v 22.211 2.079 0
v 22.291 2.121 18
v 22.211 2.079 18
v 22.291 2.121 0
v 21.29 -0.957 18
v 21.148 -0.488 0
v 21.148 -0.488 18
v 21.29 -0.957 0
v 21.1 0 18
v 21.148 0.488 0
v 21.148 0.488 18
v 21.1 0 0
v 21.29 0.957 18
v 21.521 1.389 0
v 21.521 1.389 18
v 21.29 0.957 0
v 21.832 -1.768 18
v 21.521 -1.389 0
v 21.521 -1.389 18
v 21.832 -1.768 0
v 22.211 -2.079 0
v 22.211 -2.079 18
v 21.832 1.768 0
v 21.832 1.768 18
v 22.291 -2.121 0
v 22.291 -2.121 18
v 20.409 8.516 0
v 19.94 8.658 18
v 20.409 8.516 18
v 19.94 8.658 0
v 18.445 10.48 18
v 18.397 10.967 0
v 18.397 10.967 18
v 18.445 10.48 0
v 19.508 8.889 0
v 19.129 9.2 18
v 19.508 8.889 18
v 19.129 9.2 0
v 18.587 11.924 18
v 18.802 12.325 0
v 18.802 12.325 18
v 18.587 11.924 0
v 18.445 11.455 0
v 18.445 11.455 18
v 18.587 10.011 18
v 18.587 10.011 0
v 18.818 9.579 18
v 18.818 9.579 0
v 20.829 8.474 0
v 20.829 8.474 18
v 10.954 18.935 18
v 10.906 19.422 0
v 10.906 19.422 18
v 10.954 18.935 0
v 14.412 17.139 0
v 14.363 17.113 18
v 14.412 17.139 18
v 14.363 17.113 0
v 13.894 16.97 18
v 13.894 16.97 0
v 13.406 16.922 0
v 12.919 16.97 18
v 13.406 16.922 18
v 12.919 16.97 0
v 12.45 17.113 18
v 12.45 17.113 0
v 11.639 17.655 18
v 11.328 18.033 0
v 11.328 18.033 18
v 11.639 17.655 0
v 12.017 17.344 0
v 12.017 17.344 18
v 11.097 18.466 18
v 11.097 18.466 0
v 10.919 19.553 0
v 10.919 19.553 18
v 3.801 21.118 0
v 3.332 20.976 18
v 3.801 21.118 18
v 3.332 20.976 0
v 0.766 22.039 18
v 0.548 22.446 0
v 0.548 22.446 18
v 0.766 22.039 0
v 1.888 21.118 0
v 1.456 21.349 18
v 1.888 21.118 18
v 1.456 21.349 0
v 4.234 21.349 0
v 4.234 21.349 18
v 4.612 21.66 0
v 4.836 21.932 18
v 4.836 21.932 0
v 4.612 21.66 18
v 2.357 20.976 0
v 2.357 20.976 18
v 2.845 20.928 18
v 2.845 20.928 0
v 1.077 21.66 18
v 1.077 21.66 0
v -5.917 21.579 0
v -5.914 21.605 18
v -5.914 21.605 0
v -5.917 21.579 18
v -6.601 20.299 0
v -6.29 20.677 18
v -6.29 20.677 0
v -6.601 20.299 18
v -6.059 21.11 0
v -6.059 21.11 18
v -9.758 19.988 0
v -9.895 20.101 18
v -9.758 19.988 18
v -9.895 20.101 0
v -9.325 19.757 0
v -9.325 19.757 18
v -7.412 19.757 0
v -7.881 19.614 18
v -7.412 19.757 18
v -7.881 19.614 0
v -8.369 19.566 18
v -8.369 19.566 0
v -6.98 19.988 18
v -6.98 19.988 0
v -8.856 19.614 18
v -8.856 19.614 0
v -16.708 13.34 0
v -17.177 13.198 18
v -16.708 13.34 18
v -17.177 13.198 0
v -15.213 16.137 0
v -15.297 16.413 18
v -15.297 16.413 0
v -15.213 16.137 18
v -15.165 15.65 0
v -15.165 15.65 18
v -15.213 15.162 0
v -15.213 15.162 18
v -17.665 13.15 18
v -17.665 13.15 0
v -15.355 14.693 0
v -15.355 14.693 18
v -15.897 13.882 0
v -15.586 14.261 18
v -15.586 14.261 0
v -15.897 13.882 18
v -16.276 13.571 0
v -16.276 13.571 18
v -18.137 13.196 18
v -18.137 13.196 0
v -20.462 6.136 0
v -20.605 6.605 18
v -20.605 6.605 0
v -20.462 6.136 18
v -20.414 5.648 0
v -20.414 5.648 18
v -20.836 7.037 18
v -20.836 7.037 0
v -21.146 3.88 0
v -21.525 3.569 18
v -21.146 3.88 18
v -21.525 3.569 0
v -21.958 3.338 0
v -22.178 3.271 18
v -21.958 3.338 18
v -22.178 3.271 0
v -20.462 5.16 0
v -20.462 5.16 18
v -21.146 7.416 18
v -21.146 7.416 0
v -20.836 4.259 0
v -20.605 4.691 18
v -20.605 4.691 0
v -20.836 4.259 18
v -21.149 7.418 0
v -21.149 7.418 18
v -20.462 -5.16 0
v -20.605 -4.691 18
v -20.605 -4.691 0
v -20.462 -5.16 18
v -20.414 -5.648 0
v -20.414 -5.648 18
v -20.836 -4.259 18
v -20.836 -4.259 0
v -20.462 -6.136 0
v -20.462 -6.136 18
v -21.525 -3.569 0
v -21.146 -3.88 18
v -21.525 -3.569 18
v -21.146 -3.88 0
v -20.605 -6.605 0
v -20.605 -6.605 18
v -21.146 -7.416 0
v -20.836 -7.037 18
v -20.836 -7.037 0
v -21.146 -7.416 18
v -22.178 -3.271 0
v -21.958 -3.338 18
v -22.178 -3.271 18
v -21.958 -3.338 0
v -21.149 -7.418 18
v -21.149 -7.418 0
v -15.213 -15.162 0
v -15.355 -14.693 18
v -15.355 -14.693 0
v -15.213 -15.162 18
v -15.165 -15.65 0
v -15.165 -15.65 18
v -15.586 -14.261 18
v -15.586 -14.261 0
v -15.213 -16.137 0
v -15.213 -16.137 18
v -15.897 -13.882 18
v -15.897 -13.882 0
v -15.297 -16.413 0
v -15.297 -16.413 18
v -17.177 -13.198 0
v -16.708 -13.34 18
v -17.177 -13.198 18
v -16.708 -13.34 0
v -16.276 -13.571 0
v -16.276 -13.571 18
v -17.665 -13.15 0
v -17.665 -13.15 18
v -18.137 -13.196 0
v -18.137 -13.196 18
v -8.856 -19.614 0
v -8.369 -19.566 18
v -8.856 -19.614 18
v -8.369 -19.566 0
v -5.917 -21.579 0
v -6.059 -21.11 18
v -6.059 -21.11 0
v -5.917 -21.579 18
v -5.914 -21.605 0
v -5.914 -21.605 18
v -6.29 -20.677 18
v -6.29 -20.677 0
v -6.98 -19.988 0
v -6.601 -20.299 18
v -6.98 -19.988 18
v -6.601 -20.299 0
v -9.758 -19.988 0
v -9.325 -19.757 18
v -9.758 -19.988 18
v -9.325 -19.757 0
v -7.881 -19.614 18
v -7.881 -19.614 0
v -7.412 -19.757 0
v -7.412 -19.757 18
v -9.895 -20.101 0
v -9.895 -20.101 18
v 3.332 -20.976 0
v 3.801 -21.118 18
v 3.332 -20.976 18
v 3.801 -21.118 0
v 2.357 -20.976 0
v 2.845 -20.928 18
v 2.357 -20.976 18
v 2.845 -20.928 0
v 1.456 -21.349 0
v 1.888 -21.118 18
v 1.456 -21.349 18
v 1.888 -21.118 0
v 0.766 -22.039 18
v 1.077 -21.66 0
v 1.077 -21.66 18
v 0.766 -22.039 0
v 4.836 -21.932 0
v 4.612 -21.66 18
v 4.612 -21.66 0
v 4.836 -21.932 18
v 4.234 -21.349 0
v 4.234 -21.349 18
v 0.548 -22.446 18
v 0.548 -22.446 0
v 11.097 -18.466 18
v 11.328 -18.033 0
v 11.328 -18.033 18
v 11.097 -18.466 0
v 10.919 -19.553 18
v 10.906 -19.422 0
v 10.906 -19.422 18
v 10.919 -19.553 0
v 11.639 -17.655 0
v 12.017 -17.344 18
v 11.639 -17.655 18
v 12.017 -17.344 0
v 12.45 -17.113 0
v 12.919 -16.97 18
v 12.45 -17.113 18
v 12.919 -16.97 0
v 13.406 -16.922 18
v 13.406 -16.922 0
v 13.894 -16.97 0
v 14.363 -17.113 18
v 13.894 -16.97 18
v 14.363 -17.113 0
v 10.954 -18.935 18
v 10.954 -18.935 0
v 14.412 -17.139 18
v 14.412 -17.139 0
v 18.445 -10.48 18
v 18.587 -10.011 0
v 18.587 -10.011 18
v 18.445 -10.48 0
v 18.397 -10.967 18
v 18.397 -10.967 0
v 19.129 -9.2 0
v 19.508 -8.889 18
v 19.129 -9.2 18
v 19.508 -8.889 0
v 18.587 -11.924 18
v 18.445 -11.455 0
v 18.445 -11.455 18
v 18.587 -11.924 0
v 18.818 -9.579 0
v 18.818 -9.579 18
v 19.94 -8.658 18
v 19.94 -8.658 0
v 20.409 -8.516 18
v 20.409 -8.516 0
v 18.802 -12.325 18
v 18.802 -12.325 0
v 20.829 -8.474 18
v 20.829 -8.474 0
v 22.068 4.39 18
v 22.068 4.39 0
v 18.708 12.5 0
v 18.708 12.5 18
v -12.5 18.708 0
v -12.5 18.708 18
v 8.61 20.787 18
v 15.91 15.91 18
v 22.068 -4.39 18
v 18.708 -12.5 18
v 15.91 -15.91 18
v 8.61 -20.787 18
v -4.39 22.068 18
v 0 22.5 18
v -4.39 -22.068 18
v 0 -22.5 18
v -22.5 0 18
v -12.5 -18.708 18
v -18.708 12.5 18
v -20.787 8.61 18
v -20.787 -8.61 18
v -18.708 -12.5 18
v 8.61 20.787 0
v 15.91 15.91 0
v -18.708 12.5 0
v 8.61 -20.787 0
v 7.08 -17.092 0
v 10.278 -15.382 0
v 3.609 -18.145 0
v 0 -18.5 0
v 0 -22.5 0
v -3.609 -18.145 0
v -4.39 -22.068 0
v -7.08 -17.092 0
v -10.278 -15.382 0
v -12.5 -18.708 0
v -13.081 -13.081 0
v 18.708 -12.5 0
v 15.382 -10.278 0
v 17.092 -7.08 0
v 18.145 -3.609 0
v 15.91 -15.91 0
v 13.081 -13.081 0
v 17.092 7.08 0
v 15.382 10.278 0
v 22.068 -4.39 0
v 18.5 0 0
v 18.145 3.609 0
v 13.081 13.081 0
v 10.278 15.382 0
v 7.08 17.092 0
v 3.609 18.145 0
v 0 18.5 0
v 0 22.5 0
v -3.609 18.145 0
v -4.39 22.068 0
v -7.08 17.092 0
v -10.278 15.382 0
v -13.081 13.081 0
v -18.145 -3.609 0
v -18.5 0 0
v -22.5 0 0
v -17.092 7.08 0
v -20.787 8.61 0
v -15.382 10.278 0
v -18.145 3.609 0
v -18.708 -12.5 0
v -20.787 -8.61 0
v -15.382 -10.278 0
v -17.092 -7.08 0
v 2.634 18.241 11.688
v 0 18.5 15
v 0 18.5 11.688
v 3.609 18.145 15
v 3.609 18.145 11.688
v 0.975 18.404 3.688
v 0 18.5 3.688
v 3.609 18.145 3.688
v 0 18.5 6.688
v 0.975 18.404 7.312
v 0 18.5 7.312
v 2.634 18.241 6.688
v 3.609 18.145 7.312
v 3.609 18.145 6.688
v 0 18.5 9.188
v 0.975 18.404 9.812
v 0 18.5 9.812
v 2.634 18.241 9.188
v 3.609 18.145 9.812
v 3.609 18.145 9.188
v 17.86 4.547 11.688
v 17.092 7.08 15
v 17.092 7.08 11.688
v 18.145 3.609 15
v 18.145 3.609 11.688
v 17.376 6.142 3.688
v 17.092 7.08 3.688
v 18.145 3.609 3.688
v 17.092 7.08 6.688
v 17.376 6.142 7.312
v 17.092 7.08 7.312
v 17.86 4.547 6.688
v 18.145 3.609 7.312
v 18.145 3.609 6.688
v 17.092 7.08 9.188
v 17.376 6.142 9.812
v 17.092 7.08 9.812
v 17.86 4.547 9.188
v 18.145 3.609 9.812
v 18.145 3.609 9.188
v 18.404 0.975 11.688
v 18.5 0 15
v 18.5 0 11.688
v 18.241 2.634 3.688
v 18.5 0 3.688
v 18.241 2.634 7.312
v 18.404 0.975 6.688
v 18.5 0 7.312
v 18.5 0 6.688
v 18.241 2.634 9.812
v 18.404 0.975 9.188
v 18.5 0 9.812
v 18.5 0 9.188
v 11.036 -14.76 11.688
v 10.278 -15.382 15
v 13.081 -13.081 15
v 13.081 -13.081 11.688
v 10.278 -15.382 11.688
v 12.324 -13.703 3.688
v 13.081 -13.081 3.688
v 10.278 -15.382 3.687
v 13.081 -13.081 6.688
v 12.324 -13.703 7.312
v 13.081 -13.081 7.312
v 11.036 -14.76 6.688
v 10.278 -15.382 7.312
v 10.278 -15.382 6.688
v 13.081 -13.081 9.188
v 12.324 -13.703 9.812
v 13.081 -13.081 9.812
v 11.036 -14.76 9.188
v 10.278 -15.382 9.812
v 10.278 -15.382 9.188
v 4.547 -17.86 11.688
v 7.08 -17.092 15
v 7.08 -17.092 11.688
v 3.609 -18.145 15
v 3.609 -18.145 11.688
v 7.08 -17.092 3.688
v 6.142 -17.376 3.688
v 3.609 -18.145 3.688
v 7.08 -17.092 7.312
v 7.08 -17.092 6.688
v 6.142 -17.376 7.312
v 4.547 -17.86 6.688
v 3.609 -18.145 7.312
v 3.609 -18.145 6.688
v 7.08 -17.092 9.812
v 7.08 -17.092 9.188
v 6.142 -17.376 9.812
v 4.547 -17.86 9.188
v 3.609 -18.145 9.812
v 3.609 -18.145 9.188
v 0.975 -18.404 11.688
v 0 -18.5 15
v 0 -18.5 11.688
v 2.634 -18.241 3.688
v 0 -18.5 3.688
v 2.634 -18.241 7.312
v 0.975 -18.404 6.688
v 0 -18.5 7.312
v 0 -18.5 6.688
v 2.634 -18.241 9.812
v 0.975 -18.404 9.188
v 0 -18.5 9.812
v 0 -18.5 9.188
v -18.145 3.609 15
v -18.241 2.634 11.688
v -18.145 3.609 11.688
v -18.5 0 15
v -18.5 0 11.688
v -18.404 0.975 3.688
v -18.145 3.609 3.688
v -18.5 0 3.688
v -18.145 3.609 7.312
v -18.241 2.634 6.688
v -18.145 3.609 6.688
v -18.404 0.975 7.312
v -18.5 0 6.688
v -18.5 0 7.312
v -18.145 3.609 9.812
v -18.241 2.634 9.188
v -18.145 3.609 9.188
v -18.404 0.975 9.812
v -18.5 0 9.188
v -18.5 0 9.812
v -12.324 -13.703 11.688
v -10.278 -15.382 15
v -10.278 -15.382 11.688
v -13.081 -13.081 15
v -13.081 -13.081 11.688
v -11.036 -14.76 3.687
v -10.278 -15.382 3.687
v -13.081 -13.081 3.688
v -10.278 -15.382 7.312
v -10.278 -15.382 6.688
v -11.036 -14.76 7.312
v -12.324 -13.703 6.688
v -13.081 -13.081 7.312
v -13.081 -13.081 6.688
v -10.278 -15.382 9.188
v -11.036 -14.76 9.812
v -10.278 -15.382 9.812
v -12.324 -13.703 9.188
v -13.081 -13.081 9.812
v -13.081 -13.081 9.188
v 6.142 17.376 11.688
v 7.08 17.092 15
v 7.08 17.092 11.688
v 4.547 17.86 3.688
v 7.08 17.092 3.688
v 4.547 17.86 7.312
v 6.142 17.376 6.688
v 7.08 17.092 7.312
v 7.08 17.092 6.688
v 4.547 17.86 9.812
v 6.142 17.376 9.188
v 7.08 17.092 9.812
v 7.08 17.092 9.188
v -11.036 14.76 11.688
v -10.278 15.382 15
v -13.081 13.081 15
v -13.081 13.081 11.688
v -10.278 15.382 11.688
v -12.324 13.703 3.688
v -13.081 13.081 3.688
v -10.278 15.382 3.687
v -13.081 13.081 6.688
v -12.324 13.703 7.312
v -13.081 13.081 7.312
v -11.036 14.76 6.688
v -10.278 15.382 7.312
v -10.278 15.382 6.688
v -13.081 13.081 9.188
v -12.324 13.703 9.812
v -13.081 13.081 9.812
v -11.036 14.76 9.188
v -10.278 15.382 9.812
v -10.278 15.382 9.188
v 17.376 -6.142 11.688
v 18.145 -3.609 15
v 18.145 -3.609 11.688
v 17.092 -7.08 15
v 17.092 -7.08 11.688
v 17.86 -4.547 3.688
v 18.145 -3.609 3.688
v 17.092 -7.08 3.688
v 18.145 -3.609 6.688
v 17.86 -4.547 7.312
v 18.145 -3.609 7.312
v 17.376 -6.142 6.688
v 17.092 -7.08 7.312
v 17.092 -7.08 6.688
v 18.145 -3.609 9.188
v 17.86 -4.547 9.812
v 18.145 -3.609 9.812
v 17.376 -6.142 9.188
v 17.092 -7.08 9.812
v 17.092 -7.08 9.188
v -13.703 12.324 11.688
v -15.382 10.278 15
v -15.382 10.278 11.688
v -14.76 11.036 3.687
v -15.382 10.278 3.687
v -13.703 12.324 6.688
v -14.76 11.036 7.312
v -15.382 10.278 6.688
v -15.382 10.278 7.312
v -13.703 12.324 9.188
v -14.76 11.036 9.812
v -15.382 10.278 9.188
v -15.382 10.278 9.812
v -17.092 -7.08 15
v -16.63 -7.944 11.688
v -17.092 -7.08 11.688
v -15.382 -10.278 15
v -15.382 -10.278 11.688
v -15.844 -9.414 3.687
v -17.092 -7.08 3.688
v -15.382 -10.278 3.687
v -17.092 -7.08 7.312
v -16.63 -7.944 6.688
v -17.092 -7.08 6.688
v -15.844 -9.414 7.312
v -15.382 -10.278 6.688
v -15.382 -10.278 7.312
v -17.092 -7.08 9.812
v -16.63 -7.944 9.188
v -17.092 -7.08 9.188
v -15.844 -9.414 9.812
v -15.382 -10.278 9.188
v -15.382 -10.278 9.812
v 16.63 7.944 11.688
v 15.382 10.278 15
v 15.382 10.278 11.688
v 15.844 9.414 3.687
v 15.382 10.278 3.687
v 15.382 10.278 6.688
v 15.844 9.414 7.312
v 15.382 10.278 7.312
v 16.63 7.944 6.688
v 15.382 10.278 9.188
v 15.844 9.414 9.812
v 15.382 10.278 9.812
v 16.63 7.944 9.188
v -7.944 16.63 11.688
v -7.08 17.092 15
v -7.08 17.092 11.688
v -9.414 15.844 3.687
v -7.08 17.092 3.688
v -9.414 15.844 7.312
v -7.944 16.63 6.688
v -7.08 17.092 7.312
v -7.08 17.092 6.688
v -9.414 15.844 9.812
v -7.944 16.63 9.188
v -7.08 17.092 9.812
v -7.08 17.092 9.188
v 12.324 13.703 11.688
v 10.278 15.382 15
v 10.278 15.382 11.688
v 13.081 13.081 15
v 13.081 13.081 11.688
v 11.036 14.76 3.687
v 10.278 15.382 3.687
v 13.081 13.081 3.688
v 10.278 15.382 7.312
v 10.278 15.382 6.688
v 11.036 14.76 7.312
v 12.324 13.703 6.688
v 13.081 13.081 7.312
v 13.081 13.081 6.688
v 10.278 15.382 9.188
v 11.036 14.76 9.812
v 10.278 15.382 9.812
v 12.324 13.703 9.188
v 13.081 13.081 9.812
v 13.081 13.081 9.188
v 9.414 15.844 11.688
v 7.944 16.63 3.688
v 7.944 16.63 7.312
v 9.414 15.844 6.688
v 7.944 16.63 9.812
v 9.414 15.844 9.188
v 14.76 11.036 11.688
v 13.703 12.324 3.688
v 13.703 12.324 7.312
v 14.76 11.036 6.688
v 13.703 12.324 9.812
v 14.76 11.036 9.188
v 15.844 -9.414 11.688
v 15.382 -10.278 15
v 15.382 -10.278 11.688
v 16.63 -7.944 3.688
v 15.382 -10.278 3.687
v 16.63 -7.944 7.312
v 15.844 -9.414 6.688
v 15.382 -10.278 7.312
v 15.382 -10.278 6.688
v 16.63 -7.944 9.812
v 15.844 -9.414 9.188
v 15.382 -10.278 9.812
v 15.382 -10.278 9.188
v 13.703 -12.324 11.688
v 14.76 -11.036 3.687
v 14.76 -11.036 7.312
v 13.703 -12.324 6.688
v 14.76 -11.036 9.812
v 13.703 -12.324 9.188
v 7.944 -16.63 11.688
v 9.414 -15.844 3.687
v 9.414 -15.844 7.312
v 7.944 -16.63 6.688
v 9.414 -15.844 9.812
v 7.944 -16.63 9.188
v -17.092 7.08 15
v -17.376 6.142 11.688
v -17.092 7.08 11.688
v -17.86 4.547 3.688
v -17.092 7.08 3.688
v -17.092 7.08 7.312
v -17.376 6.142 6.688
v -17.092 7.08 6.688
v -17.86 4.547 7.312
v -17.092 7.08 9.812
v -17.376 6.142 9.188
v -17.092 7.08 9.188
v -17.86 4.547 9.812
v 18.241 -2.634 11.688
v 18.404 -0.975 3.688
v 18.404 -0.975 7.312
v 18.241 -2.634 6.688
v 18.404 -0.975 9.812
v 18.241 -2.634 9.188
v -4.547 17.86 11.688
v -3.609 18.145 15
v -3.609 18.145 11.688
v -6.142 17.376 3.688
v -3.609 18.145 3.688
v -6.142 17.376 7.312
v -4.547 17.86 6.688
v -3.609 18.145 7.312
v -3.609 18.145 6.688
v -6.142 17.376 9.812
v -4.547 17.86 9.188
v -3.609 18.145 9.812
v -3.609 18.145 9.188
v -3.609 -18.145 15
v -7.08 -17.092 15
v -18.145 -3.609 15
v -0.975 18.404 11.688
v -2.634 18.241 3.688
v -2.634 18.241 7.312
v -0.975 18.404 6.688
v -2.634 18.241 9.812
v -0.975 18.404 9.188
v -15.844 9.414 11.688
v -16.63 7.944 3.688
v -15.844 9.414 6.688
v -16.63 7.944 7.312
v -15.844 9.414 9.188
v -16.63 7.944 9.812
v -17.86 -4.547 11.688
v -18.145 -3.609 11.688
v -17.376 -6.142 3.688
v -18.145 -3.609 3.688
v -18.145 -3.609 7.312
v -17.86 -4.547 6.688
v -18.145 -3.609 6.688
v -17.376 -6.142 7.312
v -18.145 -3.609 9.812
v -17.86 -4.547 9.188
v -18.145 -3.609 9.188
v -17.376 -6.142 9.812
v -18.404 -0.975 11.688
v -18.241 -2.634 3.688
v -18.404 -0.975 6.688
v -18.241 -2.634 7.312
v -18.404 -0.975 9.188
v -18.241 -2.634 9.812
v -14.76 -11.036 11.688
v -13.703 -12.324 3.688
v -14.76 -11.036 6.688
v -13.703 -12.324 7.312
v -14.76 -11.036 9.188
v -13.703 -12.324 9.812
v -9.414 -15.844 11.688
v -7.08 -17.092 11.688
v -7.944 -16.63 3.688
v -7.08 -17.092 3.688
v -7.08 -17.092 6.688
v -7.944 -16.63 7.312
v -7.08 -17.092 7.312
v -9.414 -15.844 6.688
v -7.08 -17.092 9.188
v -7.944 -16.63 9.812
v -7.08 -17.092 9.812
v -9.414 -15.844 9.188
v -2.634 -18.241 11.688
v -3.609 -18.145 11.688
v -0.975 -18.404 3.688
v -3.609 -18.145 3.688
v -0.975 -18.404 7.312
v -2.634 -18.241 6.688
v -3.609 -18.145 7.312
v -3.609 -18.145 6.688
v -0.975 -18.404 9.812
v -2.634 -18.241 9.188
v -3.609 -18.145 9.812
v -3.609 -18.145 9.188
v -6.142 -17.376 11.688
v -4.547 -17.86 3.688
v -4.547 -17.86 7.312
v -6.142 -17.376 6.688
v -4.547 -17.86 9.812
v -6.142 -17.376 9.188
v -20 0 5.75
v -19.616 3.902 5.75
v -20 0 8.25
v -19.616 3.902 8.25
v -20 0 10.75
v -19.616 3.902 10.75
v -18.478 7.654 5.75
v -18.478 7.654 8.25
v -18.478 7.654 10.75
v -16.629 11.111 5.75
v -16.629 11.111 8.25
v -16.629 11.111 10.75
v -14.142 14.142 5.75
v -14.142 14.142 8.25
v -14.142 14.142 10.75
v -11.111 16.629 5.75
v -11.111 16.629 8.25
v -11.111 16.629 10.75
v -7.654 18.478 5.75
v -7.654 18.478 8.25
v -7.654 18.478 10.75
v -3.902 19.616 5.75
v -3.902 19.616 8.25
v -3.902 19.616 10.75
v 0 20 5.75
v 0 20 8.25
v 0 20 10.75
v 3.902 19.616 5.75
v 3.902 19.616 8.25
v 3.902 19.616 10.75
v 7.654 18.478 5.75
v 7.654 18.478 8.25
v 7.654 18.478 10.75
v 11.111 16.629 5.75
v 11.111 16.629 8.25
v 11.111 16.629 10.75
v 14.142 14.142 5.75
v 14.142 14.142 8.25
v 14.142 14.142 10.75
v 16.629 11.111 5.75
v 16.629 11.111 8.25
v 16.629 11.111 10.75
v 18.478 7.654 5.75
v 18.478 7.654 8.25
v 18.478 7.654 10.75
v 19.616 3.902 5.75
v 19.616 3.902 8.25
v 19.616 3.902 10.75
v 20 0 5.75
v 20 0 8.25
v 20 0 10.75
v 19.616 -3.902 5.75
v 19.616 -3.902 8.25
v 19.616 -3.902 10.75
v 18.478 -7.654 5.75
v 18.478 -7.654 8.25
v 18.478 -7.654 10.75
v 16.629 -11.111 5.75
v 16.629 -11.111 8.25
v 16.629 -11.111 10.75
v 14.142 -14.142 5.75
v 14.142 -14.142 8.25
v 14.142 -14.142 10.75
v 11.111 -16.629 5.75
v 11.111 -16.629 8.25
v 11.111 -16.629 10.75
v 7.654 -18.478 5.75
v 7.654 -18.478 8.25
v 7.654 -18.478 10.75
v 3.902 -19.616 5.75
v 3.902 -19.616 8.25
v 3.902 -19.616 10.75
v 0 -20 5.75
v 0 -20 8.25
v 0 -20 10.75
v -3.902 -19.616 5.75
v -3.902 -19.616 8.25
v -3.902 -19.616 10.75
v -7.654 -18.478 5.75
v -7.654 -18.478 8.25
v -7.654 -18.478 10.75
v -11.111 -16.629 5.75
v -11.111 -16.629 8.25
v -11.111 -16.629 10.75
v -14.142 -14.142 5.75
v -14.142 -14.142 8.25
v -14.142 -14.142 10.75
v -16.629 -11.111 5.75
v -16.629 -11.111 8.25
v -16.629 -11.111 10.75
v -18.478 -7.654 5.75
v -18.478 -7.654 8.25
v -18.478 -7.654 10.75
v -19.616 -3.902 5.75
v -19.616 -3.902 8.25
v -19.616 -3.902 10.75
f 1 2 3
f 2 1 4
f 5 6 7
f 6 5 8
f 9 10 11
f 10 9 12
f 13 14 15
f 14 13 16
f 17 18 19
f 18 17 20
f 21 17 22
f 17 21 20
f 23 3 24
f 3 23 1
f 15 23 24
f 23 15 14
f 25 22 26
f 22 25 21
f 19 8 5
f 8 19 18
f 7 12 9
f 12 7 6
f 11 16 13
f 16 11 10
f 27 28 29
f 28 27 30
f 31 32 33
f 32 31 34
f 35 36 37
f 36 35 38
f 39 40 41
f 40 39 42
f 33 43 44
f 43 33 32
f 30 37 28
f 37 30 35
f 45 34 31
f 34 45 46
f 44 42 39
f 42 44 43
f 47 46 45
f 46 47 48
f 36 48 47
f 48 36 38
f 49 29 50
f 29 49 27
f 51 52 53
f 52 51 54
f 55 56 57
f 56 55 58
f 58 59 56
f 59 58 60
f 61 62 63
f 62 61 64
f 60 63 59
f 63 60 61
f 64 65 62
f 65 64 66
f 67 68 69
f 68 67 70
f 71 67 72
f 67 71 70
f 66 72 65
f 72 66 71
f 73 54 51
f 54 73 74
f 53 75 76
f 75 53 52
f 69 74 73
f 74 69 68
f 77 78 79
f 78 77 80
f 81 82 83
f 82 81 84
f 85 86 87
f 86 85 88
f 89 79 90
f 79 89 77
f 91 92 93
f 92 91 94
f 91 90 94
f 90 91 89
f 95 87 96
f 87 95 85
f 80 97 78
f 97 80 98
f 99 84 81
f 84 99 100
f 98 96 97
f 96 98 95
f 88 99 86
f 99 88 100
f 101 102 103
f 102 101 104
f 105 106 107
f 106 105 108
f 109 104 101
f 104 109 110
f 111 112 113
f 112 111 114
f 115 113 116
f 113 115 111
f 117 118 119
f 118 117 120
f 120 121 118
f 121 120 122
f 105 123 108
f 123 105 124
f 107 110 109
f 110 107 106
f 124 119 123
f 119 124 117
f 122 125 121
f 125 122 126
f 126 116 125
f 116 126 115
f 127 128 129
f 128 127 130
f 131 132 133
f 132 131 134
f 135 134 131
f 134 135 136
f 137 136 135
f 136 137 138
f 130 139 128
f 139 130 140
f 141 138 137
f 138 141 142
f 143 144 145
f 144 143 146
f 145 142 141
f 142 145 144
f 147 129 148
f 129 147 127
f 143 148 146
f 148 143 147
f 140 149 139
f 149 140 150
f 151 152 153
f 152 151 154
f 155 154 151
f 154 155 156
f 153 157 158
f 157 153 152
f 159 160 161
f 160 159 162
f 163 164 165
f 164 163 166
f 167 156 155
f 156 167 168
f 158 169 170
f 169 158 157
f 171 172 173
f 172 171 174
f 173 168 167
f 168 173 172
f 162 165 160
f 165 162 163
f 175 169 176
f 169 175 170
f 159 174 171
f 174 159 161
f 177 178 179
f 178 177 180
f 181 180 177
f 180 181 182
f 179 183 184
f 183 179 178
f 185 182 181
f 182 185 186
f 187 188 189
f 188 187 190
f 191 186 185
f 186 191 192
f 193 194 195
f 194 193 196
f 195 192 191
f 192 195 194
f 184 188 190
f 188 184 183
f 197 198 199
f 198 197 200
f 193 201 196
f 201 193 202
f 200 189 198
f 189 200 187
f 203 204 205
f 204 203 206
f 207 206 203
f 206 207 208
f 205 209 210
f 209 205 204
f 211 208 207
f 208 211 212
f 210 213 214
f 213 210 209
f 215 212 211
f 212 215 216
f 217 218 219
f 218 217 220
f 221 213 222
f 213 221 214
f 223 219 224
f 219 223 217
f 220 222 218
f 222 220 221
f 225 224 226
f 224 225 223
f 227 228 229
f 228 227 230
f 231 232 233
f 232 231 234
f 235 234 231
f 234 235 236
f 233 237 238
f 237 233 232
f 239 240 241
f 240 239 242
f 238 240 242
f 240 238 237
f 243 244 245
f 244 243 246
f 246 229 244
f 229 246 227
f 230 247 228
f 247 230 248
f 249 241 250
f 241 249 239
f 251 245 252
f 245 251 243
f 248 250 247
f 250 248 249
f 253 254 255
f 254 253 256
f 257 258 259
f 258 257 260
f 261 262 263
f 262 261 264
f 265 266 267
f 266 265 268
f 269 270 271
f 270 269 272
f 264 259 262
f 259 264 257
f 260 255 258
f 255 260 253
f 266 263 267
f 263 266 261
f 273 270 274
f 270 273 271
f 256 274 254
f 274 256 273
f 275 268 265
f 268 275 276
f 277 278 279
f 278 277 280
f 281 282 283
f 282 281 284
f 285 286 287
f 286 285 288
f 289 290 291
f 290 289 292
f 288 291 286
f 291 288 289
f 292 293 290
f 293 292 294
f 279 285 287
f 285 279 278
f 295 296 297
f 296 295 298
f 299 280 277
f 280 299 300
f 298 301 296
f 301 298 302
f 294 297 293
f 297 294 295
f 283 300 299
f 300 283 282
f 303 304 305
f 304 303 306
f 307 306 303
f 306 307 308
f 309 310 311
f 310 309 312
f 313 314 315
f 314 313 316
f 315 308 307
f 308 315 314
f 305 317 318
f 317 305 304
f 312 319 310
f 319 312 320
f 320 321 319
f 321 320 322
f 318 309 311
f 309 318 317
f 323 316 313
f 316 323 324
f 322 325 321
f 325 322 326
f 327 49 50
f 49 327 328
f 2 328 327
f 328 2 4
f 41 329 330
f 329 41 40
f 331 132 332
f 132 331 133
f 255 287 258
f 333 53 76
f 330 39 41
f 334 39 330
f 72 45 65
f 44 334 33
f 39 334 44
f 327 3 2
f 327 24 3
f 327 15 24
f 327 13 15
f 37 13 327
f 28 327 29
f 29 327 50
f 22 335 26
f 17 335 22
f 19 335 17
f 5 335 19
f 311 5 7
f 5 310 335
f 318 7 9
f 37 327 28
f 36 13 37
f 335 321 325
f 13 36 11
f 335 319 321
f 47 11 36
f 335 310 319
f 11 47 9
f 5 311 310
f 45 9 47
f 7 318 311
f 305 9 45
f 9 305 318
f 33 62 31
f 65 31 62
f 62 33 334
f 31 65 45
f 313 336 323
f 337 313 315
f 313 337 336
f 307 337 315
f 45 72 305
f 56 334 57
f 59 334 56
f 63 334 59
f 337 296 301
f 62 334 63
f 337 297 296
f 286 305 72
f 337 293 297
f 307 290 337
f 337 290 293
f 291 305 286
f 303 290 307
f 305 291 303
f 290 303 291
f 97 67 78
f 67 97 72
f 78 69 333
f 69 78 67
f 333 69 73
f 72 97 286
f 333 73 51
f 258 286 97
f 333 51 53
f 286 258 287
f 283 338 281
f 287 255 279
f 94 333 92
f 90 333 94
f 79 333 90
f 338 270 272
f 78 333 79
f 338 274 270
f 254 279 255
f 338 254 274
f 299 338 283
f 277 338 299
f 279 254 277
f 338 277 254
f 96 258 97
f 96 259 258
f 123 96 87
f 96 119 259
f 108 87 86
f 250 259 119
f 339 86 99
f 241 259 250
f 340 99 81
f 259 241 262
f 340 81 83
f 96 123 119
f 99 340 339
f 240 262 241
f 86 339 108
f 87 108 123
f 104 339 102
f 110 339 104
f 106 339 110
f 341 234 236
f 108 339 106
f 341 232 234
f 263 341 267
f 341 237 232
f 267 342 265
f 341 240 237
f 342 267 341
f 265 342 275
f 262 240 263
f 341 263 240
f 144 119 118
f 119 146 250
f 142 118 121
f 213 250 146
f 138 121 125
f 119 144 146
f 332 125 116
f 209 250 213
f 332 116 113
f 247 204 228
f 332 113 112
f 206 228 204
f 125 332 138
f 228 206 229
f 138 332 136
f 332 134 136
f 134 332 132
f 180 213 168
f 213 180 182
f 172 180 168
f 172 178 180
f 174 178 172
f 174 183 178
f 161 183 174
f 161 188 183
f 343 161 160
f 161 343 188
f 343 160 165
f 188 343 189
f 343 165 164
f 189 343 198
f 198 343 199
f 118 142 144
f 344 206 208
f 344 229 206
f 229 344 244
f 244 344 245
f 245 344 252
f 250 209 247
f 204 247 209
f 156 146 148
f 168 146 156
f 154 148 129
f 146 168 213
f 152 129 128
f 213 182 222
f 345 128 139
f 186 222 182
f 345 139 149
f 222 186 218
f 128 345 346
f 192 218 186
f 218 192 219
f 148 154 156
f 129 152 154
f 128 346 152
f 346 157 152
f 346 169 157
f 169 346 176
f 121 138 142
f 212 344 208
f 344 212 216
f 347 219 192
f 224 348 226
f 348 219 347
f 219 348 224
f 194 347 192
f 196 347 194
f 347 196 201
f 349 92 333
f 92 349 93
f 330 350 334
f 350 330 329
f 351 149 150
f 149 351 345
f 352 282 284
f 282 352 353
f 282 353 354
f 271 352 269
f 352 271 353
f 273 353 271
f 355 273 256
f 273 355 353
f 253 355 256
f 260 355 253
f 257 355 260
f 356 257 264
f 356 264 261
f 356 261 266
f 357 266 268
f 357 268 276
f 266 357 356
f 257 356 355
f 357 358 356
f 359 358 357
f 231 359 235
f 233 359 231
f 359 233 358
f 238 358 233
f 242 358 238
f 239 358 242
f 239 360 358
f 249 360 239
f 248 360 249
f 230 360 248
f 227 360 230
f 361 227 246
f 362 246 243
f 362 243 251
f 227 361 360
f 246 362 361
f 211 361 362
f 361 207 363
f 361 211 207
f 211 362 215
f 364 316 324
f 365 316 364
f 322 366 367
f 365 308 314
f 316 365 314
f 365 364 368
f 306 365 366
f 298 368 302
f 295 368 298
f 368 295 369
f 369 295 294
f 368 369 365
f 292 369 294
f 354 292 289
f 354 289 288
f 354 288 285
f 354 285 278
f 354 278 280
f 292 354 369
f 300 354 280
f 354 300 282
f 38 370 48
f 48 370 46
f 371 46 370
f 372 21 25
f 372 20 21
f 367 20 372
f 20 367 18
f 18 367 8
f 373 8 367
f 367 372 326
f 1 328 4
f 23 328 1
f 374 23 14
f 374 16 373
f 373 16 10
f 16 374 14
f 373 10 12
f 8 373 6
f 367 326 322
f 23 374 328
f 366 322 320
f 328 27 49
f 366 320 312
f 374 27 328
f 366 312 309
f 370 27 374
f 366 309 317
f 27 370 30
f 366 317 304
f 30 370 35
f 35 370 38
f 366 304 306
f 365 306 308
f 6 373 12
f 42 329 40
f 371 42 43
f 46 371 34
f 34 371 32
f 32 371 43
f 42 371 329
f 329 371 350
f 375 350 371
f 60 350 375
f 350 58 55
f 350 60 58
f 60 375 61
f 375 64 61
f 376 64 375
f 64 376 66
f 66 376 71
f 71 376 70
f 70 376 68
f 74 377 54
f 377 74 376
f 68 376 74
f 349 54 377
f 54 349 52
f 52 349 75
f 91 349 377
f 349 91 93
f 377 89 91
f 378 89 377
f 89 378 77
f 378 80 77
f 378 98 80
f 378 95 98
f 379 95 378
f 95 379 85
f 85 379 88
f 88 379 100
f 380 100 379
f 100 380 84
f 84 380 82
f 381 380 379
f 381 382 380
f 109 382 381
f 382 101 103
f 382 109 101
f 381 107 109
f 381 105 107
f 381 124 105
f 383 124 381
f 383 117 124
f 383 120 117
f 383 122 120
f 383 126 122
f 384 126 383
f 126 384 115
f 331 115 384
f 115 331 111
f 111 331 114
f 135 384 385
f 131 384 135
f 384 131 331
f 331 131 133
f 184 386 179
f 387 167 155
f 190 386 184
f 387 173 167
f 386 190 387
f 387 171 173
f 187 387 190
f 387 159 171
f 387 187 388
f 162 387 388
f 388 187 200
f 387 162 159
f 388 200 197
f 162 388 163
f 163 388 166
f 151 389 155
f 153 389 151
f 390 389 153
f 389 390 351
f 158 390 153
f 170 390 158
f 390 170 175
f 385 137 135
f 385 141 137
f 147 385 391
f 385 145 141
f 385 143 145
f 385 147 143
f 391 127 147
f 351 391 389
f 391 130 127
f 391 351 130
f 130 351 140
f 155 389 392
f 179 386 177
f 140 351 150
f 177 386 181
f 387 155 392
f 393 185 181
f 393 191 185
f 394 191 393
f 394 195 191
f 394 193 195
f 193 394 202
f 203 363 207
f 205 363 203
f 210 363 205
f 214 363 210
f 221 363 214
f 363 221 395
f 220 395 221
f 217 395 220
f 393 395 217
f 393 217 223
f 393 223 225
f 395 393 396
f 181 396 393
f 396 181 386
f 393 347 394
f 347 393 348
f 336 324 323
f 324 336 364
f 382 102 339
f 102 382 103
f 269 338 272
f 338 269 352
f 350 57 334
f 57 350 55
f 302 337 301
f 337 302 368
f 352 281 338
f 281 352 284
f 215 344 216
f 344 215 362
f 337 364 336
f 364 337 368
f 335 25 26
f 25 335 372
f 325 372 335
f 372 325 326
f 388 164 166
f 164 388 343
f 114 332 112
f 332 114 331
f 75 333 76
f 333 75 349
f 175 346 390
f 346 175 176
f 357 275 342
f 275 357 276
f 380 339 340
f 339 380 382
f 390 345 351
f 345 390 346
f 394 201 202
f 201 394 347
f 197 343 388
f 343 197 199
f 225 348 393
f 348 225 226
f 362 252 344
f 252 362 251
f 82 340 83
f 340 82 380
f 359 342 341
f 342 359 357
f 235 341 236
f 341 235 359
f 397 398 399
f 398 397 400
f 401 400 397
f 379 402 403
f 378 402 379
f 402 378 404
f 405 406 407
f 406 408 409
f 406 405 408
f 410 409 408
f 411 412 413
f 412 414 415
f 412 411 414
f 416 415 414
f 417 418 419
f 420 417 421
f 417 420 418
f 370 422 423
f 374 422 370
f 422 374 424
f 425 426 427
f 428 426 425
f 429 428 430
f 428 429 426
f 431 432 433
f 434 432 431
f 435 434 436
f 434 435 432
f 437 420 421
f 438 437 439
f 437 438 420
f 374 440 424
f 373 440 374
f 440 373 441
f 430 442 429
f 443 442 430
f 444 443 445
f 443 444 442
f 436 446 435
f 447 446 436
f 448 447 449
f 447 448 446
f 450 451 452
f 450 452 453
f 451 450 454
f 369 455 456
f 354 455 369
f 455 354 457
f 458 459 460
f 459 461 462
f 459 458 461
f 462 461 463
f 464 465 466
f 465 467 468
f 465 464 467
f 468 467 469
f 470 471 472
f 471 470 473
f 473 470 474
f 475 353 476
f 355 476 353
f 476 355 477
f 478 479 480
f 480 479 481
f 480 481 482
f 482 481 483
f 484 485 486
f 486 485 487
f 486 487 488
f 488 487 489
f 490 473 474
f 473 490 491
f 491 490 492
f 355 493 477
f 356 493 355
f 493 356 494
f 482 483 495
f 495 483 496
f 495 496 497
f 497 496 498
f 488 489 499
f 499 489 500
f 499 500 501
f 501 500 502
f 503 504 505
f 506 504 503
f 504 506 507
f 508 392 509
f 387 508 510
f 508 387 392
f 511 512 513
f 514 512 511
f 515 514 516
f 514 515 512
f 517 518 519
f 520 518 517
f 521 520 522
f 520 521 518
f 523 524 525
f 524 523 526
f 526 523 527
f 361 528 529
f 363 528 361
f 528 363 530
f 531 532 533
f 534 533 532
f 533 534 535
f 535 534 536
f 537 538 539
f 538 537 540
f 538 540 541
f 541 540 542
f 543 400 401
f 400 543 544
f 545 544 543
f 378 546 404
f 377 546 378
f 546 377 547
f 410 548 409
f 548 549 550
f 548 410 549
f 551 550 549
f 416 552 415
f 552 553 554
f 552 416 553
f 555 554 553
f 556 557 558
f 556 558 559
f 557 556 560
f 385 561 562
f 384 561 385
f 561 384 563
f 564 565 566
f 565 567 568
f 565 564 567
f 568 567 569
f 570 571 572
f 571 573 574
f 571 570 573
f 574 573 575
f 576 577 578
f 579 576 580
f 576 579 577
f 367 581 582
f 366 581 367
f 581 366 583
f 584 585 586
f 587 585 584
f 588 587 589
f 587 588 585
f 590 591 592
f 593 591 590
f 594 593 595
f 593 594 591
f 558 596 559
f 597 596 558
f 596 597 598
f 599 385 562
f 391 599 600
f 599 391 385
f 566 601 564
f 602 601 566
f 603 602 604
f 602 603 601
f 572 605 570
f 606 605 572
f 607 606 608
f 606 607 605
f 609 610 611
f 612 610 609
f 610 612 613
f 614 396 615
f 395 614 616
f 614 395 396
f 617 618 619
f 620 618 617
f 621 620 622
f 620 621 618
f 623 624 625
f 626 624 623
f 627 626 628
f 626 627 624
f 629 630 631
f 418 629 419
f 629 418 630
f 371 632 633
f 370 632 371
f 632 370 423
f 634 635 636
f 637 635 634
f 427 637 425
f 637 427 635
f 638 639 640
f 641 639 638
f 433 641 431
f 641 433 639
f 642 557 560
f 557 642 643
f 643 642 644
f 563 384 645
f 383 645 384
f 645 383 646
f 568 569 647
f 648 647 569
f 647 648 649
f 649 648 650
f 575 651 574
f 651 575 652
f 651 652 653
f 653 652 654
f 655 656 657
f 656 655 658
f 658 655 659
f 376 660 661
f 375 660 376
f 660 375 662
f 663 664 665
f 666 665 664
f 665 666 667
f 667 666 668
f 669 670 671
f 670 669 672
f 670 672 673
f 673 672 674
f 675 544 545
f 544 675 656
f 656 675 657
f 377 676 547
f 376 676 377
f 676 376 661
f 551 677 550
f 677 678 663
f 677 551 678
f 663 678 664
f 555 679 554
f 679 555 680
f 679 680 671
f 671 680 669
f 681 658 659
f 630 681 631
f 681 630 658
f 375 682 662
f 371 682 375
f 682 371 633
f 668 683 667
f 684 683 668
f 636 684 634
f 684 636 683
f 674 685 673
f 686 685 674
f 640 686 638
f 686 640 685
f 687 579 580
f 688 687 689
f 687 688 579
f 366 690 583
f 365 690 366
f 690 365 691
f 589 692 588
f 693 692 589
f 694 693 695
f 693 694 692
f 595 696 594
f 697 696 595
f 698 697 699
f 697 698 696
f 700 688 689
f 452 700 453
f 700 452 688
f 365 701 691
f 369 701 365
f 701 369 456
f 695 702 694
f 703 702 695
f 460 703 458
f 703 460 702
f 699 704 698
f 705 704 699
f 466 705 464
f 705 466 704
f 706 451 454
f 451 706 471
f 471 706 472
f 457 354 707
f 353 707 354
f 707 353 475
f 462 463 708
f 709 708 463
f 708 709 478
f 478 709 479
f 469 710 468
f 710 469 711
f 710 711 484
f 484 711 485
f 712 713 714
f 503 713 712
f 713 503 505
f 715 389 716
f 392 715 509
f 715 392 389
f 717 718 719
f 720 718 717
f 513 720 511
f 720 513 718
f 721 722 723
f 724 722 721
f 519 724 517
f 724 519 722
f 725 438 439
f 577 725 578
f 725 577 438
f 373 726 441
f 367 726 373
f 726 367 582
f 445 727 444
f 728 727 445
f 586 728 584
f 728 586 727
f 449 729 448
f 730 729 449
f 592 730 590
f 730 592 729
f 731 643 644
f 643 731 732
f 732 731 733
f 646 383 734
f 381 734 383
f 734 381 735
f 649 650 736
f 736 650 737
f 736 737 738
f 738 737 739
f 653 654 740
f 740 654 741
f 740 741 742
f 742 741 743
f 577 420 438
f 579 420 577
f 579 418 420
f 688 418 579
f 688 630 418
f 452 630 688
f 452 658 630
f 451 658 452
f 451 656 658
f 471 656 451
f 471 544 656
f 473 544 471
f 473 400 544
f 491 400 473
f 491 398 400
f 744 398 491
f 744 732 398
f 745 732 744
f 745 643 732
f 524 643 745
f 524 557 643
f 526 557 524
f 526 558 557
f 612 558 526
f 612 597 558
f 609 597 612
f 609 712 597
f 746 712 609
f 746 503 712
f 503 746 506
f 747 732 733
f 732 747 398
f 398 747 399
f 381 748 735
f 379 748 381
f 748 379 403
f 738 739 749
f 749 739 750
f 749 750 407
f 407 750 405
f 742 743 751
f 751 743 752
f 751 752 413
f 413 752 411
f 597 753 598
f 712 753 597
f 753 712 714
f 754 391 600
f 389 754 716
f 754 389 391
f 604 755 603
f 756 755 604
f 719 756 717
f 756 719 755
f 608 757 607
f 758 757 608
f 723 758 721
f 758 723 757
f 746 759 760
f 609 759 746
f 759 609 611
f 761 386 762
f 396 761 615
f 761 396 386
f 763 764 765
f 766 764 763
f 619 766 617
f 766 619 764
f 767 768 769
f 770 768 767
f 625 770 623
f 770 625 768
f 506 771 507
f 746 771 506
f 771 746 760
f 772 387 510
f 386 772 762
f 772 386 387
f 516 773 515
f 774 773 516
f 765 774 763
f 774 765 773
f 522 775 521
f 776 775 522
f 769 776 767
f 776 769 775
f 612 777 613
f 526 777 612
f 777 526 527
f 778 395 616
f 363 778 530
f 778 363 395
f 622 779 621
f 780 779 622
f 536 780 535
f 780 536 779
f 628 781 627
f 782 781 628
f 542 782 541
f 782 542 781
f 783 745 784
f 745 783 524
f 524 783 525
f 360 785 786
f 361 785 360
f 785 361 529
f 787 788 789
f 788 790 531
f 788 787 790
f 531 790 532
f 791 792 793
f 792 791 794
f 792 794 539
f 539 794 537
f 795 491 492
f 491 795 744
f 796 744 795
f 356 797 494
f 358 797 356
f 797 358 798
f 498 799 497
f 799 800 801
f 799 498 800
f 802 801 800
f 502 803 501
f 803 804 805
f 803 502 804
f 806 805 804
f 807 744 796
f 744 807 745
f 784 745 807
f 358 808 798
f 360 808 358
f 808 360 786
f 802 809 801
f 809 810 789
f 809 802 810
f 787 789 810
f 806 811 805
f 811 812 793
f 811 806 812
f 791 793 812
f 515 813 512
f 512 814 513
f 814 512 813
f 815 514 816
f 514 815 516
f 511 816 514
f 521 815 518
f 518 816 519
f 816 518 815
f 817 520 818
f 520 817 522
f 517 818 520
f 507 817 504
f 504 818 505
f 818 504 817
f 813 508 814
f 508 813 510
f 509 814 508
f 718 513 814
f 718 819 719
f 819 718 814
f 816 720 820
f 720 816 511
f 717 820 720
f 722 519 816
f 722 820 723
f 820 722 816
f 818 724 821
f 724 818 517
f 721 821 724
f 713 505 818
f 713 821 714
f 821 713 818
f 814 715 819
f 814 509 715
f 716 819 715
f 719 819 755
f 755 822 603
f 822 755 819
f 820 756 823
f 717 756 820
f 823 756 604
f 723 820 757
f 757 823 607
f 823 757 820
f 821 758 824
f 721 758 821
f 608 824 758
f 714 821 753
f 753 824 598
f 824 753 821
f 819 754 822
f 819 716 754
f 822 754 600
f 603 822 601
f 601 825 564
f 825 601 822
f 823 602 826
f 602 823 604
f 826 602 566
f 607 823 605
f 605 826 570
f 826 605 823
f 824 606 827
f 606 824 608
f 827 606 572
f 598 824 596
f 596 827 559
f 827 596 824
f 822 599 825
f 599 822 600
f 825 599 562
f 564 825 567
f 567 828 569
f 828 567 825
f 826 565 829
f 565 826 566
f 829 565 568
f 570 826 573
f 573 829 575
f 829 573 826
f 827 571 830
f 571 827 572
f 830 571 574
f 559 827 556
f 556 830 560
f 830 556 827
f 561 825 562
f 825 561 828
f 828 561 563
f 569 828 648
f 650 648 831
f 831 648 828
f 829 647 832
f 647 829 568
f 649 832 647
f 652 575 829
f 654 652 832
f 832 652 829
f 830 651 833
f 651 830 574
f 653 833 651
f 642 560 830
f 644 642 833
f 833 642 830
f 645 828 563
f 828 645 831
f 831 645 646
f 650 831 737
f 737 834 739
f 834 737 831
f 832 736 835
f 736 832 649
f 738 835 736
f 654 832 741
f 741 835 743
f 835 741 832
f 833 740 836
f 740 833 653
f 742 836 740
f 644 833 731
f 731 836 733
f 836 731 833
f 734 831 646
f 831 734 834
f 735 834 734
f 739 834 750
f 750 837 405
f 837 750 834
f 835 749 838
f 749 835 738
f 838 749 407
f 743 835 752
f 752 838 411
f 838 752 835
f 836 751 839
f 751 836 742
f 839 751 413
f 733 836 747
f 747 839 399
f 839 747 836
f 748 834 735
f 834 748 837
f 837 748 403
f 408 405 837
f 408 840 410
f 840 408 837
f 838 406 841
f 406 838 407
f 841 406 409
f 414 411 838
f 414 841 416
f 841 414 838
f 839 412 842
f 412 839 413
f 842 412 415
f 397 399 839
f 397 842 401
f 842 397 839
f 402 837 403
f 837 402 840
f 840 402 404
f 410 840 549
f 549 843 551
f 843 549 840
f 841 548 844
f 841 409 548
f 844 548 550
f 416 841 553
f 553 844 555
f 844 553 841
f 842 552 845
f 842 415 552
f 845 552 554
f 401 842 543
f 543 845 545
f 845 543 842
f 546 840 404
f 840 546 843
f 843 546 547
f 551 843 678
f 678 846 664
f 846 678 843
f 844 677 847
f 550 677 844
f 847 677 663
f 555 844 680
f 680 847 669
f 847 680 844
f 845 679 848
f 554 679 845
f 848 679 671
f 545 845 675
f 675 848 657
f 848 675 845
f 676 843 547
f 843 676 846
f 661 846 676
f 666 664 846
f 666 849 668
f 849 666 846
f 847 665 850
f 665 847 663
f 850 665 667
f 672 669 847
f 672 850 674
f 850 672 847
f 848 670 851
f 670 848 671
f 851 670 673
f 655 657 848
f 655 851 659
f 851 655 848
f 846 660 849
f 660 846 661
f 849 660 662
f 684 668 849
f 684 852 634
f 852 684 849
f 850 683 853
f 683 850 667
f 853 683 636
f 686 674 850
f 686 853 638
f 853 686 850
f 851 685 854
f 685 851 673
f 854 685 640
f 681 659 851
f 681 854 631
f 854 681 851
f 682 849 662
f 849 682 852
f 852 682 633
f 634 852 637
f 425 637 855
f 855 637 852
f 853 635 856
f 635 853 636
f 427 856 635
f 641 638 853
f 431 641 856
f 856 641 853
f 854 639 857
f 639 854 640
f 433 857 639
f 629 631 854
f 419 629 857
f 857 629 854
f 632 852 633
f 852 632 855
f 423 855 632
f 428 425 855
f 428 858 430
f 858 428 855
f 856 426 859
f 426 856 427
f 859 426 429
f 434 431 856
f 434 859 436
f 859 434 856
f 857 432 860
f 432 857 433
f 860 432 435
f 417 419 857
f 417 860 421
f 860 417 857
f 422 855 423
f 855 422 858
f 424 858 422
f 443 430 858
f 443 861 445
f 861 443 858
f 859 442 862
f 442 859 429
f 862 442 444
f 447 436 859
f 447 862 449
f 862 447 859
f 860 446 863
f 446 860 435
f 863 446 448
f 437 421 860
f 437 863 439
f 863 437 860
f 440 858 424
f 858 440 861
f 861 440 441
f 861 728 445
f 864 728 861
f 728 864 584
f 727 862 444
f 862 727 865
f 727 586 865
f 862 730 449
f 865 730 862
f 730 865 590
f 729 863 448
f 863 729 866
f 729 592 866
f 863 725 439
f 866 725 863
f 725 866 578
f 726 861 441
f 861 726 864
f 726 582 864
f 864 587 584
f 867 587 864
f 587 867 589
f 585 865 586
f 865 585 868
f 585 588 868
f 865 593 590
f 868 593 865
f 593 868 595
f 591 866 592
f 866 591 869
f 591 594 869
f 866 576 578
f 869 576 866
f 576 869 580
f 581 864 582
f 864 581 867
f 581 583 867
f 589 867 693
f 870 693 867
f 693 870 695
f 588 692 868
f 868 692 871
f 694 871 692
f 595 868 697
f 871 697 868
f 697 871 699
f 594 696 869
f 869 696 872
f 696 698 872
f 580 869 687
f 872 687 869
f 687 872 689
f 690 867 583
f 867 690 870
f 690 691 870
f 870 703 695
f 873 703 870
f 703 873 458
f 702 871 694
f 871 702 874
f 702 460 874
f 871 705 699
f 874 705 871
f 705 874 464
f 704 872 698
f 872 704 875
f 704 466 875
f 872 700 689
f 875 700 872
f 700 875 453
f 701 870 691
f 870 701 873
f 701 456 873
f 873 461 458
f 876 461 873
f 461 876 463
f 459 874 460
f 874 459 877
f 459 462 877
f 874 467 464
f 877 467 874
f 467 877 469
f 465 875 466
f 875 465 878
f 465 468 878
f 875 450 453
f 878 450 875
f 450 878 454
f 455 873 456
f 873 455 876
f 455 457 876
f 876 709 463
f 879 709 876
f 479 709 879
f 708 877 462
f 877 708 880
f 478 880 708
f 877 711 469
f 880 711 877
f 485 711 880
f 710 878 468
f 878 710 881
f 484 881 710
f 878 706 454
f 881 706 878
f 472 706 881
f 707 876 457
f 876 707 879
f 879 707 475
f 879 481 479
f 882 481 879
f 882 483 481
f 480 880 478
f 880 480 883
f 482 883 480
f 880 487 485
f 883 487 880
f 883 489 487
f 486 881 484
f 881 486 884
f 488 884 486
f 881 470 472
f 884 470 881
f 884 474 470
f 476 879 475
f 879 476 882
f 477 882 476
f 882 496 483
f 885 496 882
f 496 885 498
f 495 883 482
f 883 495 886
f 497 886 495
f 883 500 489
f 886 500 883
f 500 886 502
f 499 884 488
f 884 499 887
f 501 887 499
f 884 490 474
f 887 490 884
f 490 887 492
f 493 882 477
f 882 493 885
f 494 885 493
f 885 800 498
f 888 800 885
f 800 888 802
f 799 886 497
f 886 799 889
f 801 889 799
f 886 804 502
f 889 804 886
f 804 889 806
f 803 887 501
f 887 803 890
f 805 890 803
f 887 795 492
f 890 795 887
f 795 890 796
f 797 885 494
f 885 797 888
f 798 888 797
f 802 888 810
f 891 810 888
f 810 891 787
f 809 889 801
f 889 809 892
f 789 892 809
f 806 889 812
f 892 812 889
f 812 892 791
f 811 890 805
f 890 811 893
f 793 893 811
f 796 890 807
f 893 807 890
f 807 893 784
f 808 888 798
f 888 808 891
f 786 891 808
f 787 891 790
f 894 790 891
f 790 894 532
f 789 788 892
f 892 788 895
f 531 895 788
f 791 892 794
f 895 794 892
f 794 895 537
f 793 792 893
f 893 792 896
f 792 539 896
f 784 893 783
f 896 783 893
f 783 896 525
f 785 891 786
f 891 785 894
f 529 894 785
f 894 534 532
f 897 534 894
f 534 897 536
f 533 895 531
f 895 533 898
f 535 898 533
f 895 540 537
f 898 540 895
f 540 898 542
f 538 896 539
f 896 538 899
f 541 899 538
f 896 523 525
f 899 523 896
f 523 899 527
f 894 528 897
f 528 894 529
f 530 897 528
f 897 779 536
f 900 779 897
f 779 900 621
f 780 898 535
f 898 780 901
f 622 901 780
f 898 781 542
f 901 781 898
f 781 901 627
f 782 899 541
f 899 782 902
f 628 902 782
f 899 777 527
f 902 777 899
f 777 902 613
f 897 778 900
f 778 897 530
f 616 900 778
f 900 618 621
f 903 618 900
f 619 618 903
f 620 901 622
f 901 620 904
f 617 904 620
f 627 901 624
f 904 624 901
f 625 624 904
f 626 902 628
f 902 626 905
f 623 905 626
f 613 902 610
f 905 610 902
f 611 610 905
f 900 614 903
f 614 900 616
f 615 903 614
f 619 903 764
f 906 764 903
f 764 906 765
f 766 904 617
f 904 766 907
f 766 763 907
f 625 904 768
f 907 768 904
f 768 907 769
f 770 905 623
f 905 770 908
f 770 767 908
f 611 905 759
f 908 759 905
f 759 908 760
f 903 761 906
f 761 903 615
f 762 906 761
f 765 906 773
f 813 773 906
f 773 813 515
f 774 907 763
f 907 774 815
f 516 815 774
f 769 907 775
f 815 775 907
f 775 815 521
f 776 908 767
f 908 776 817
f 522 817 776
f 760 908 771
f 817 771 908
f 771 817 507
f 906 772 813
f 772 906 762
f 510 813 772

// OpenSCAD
$fn = 32;

// ----------------------------------------------------------------------
// Threaded cap: 45 mm body, 18 mm tall, 37 mm threaded bore
// ----------------------------------------------------------------------

// --- parameters (mm) ---
outer_d = 45;             // cap outside diameter
body_h = 18;              // cap height
top_t = 3;                // closed top thickness
bore_d = 37;              // bore core diameter
pitch = 2.5;              // thread pitch
thread_d = 1.5;           // thread depth
thread_z = 3;             // thread start above the rim
thread_h = 9;             // threaded height
flutes = 13;              // number of knurl flutes
flute_d = 5;              // flute cutter diameter
flute_depth = 1.4;        // flute depth into the rim

difference() {
  union() {
    cylinder(h = 18, d = outer_d);
  }
  /* threaded bore, closed at the top */
  translate([0, 0, -2.5]) cylinder(h = 17.5, d = bore_d);
  translate([0, 0, 3]) rotate_extrude() polygon([[17.5, 0], [17.5, 9], [18, 9], [20, 7.75], [18, 6.5], [20, 5.25], [18, 4], [20, 2.75], [18, 0], [17.5, 0]]);
  /* knurl flutes around the rim */
  for (i = [0 : flutes - 1]) {
    a = i * 360 / flutes;
    translate([(outer_d / 2 + flute_d / 2 - flute_depth) * cos(a), (outer_d / 2 + flute_d / 2 - flute_depth) * sin(a), -2.5]) cylinder(h = body_h + 5, d = flute_d);
  }
}
